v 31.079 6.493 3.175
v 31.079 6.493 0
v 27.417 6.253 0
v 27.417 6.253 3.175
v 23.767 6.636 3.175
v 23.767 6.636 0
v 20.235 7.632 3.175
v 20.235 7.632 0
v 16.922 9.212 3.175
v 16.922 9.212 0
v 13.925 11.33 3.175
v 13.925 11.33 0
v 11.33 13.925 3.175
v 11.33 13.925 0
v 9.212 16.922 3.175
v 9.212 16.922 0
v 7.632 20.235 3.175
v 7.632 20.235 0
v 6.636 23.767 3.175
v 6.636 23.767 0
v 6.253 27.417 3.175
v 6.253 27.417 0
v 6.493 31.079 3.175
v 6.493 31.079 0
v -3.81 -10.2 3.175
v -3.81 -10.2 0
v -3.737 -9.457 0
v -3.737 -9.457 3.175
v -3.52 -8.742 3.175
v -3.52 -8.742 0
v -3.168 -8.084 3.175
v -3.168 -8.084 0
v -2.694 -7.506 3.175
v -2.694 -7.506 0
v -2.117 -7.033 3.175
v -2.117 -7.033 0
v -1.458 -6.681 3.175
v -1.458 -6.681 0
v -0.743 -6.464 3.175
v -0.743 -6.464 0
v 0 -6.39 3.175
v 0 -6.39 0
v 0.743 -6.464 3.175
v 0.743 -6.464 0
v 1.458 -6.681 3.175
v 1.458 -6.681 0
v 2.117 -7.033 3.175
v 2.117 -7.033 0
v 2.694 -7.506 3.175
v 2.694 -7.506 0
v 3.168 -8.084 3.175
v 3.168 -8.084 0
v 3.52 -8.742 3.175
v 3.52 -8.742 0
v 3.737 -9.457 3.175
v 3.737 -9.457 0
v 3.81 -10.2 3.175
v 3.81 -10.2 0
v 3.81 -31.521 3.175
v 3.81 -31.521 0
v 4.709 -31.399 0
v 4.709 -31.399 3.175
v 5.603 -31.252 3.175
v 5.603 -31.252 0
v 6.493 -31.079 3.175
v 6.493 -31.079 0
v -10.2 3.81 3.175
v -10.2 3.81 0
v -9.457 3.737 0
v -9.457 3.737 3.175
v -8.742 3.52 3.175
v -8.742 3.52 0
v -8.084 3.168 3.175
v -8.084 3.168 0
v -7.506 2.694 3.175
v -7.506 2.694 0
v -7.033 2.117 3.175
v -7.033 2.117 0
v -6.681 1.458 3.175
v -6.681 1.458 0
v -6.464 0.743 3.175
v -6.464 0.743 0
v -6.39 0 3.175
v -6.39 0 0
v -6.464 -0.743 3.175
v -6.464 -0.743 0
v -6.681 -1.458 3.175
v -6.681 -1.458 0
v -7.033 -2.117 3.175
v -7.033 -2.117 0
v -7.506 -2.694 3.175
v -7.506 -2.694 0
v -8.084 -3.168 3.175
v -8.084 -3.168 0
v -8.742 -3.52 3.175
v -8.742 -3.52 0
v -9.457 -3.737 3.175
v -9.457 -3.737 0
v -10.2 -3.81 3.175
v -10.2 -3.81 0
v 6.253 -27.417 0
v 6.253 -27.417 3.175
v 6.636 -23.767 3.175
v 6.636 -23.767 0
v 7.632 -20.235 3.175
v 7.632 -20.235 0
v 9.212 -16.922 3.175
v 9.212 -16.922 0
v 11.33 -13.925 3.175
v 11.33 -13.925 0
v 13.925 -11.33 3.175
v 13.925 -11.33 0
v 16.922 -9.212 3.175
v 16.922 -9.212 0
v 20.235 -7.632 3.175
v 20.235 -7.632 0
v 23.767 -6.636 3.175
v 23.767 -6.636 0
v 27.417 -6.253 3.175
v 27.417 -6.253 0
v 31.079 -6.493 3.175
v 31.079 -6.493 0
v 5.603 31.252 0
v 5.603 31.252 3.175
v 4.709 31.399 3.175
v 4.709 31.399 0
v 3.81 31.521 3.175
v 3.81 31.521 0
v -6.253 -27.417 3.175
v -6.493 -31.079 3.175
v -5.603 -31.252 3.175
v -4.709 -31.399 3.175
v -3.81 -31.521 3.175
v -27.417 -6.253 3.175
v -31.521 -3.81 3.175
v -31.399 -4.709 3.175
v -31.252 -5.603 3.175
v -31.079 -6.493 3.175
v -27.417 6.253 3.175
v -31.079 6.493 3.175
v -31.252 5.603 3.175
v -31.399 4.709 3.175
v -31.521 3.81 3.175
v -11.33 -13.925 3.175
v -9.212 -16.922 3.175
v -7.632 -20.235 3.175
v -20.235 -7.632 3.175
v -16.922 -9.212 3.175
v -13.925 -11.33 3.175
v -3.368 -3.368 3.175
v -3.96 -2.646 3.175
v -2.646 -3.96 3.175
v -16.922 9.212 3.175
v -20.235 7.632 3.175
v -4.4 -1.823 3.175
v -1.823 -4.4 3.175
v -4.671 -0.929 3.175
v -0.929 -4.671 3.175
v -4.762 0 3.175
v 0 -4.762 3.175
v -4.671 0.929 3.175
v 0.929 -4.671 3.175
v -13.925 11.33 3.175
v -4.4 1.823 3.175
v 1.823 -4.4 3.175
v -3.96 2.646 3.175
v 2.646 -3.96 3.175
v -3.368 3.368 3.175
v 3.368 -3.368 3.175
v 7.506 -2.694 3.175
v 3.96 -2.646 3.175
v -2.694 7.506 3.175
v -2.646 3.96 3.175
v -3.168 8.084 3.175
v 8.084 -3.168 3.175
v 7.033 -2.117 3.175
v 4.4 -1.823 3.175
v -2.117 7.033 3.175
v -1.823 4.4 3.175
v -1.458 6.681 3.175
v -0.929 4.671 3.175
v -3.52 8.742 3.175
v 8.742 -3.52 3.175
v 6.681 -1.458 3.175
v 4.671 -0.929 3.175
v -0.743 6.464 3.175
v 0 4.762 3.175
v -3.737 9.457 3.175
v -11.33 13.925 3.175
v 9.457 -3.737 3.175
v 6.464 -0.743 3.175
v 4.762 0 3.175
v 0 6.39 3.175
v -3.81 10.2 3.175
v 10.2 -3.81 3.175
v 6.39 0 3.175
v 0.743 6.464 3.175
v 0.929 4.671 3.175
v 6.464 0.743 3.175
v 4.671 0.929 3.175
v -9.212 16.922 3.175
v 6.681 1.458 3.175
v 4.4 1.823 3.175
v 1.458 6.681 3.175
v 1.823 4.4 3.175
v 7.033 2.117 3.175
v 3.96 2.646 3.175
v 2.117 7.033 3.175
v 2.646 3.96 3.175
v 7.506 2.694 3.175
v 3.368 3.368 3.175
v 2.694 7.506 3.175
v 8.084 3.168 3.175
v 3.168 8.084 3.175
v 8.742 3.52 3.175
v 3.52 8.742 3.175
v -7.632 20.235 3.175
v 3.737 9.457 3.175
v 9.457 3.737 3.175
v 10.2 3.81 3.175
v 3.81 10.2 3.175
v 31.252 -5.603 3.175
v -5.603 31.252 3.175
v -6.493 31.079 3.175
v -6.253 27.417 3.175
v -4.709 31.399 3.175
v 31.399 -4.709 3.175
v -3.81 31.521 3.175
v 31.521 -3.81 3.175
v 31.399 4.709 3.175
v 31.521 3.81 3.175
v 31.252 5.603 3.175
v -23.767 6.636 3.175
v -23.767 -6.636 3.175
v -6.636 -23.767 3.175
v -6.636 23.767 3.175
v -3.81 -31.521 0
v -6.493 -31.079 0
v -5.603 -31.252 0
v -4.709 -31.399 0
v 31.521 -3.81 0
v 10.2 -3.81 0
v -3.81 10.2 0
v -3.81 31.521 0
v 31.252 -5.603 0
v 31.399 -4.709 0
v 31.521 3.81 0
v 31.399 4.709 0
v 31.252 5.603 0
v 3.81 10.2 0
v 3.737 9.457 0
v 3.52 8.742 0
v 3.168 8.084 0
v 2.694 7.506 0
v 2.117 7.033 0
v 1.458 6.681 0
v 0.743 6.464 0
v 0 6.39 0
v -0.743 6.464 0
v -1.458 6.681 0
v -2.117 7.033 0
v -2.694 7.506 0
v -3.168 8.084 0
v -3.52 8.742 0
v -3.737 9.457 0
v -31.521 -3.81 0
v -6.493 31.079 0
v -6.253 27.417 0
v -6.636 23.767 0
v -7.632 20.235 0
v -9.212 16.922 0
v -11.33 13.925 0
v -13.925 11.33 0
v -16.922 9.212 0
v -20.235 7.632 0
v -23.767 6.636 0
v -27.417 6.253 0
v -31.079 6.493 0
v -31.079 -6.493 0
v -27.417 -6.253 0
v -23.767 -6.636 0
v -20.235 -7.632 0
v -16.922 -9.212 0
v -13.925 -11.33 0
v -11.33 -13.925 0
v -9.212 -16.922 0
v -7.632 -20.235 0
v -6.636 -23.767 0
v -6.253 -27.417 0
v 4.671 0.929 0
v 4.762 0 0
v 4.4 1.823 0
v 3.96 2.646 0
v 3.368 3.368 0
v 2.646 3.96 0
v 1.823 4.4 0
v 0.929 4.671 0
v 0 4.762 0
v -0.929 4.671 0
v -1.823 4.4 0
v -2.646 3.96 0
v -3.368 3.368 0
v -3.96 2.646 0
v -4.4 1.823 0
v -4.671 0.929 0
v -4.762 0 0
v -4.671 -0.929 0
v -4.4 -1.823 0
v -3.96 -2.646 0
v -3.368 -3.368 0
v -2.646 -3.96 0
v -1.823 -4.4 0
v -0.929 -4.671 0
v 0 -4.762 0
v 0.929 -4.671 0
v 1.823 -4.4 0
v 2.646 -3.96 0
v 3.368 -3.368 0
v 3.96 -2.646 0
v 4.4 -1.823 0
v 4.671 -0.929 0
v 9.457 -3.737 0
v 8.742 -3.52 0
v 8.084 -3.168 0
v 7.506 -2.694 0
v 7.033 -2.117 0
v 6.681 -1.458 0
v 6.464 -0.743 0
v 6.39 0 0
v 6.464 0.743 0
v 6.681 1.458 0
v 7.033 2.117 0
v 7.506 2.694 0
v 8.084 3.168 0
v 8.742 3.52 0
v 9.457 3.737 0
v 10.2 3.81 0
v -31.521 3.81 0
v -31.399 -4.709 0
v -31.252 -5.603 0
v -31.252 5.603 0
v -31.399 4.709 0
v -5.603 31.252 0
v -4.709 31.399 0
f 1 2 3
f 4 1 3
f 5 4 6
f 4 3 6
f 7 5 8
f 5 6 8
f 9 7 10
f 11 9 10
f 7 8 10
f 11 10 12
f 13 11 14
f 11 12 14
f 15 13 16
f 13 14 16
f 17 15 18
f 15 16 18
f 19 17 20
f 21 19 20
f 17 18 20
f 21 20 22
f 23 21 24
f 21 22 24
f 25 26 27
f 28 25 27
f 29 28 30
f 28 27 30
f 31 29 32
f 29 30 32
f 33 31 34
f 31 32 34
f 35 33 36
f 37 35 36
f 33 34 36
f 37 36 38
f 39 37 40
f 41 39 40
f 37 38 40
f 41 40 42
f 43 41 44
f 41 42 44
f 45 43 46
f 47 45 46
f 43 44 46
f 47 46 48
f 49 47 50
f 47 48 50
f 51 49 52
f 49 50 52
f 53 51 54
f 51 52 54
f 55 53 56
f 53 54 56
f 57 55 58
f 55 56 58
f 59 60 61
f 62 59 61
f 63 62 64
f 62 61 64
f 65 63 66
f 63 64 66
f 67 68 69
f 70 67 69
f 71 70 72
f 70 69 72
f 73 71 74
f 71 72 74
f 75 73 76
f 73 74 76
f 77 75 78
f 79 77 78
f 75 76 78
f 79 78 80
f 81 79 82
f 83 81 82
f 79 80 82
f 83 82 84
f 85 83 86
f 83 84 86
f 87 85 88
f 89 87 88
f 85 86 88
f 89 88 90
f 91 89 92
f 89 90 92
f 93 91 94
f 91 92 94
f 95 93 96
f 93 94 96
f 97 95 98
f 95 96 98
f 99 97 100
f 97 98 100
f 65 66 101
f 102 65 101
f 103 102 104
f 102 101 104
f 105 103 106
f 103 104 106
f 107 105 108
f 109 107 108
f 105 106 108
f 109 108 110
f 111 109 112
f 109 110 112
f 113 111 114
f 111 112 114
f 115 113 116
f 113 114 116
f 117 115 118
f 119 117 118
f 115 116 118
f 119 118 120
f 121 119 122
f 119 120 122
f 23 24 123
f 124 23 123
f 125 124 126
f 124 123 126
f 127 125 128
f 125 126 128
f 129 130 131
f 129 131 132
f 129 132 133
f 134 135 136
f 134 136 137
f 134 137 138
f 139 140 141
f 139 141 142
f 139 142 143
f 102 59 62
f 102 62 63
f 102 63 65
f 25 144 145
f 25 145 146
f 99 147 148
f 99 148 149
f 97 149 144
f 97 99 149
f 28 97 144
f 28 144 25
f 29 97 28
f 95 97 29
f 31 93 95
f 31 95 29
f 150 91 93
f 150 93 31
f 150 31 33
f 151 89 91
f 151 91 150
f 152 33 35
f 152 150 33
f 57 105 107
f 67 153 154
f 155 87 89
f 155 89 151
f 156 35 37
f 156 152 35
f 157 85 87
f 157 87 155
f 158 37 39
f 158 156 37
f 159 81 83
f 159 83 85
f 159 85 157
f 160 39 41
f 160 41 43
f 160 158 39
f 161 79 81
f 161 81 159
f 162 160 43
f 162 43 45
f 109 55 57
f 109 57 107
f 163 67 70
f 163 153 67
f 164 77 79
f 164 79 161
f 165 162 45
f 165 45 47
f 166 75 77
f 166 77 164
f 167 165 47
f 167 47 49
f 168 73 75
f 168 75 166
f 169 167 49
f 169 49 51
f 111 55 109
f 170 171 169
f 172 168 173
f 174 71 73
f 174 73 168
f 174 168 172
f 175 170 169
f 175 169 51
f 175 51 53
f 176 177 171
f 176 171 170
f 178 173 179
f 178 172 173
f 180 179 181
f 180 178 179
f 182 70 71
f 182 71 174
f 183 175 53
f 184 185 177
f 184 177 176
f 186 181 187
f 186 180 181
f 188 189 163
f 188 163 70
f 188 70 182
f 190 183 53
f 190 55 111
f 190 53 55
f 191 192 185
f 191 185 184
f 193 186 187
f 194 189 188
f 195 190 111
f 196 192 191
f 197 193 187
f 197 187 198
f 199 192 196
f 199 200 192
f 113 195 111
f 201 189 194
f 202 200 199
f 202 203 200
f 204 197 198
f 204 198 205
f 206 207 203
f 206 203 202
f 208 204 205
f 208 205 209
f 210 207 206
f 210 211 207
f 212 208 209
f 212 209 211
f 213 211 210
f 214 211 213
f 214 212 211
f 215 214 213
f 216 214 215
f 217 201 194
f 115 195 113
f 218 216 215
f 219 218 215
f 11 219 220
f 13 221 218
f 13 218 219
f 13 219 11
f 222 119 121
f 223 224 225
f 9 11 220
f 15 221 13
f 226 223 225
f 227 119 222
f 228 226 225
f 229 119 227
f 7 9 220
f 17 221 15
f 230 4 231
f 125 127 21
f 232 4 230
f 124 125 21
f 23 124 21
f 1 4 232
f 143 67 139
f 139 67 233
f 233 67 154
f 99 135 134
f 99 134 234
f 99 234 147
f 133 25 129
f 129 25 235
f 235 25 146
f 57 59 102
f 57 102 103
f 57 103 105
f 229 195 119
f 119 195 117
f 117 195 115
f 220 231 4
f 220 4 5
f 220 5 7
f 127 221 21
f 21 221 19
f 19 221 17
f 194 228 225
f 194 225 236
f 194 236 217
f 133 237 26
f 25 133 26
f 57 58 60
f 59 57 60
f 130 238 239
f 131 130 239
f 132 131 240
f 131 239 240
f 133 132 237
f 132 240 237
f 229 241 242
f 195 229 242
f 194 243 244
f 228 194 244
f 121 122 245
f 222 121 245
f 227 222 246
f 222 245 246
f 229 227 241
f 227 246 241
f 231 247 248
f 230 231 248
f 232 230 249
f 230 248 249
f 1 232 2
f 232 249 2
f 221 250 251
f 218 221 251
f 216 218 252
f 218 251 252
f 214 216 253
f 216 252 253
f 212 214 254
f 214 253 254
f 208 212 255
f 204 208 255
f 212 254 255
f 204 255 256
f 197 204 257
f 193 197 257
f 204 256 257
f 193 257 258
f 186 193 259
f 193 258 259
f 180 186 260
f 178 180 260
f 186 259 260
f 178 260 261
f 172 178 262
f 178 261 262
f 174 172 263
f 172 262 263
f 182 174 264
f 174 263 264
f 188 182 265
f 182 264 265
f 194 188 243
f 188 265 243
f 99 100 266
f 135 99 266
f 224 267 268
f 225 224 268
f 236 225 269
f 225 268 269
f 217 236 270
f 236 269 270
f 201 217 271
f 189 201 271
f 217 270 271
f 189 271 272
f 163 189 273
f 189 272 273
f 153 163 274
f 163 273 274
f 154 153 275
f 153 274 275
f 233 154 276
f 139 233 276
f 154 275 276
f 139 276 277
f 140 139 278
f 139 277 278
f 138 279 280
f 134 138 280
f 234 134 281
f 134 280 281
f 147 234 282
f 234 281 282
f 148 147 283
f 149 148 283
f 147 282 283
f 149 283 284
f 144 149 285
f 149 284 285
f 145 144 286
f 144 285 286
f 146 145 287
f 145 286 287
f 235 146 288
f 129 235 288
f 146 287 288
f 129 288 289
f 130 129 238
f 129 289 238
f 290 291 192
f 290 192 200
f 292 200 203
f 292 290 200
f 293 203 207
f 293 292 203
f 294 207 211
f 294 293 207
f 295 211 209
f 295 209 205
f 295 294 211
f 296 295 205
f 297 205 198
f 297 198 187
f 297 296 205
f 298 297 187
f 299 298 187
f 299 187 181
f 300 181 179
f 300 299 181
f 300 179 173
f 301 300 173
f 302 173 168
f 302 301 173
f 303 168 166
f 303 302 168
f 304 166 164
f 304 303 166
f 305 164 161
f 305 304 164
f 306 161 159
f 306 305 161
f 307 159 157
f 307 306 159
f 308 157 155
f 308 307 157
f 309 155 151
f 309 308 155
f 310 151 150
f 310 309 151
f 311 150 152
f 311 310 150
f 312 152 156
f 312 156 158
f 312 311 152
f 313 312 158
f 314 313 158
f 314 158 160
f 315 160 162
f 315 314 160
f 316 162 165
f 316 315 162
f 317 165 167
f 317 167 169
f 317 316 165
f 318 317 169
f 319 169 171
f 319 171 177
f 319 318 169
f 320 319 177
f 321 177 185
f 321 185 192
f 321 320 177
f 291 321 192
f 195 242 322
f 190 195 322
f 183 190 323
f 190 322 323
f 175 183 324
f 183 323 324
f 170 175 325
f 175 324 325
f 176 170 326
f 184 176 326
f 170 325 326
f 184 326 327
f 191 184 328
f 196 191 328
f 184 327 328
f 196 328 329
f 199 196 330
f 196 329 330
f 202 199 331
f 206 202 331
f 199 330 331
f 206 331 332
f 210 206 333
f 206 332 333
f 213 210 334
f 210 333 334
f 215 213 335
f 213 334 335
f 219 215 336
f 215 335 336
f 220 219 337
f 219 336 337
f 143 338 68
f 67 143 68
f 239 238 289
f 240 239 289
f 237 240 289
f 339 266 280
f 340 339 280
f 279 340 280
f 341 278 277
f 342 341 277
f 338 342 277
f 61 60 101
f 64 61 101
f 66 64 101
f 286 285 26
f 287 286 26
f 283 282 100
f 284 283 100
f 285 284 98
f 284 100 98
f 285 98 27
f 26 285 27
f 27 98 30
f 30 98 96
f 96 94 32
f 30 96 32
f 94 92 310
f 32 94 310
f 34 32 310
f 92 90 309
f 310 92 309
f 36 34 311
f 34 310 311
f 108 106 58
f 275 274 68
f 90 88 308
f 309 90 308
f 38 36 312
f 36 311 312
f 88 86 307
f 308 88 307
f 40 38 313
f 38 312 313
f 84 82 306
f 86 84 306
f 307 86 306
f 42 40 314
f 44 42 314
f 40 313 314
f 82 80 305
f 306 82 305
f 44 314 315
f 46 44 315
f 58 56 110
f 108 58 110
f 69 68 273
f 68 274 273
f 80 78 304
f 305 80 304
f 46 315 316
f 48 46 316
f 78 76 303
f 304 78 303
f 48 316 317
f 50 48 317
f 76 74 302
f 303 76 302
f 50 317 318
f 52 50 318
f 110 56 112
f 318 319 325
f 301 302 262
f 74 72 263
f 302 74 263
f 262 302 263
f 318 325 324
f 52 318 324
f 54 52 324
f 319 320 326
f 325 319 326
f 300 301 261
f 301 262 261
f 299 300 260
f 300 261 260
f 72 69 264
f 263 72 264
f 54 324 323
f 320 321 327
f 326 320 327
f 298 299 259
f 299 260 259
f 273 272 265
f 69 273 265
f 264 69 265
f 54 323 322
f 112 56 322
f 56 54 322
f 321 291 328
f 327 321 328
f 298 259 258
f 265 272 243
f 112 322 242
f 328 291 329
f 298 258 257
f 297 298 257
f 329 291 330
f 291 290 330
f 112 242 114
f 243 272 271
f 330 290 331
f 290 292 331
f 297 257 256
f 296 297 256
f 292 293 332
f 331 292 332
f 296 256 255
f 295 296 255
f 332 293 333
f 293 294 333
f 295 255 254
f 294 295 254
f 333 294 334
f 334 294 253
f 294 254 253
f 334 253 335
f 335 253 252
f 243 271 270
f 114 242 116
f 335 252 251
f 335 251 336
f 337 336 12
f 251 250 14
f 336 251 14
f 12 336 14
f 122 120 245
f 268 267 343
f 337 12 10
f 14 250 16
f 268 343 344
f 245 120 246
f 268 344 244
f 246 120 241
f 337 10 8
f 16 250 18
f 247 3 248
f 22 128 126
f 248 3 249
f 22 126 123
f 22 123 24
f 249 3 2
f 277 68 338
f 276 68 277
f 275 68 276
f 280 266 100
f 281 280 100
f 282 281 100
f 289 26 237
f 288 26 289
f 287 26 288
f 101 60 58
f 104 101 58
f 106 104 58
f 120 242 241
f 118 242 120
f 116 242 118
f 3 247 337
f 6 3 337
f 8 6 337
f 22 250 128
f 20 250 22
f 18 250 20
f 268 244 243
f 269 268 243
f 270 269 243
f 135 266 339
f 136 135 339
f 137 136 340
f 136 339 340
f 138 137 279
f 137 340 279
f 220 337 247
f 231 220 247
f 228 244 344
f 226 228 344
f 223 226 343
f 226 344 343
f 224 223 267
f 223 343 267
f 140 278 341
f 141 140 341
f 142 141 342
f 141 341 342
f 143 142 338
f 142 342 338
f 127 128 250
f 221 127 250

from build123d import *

# Parameters (mm, degrees)
F0_R     = 4.7625
F1_DEPTH = 3.175


with BuildPart() as f1:
    # F0 (on Top) → F1 (new body)
    with BuildSketch(Plane.XY):
        with BuildLine():
            ThreePointArc((-6.49331, 31.078922), (-12.572359, 12.572359), (-31.078922, 6.49331))
            ThreePointArc((-31.078922, 6.49331), (-31.328488, 5.156386), (-31.520571, 3.81))
            Line((-31.520571, 3.81), (-10.200497, 3.81))
            ThreePointArc((-10.200497, 3.81), (-6.390497, 0), (-10.200497, -3.81))
            Line((-10.200497, -3.81), (-31.520571, -3.81))
            ThreePointArc((-31.520571, -3.81), (-31.328488, -5.156386), (-31.078922, -6.49331))
            ThreePointArc((-31.078922, -6.49331), (-12.572359, -12.572359), (-6.49331, -31.078922))
            ThreePointArc((-6.49331, -31.078922), (-5.156386, -31.328488), (-3.81, -31.520571))
            Line((-3.81, -31.520571), (-3.81, -10.200497))
            ThreePointArc((-3.81, -10.200497), (0, -6.390497), (3.81, -10.200497))
            Line((3.81, -10.200497), (3.81, -31.520571))
            ThreePointArc((3.81, -31.520571), (5.156386, -31.328488), (6.49331, -31.078922))
            ThreePointArc((6.49331, -31.078922), (12.572359, -12.572359), (31.078922, -6.49331))
            ThreePointArc((31.078922, -6.49331), (31.328488, -5.156386), (31.520571, -3.81))
            Line((31.520571, -3.81), (10.200497, -3.81))
            ThreePointArc((10.200497, -3.81), (6.390497, 0), (10.200497, 3.81))
            Line((10.200497, 3.81), (31.520571, 3.81))
            ThreePointArc((31.520571, 3.81), (31.328488, 5.156386), (31.078922, 6.49331))
            ThreePointArc((31.078922, 6.49331), (12.572359, 12.572359), (6.49331, 31.078922))
            ThreePointArc((6.49331, 31.078922), (5.156386, 31.328488), (3.81, 31.520571))
            Line((3.81, 31.520571), (3.81, 10.200497))
            ThreePointArc((3.81, 10.200497), (0, 6.390497), (-3.81, 10.200497))
            Line((-3.81, 10.200497), (-3.81, 31.520571))
            ThreePointArc((-3.81, 31.520571), (-5.156386, 31.328488), (-6.49331, 31.078922))
        make_face()
        Circle(F0_R, mode=Mode.SUBTRACT)
    extrude(amount=F1_DEPTH)


solid = f1.part
